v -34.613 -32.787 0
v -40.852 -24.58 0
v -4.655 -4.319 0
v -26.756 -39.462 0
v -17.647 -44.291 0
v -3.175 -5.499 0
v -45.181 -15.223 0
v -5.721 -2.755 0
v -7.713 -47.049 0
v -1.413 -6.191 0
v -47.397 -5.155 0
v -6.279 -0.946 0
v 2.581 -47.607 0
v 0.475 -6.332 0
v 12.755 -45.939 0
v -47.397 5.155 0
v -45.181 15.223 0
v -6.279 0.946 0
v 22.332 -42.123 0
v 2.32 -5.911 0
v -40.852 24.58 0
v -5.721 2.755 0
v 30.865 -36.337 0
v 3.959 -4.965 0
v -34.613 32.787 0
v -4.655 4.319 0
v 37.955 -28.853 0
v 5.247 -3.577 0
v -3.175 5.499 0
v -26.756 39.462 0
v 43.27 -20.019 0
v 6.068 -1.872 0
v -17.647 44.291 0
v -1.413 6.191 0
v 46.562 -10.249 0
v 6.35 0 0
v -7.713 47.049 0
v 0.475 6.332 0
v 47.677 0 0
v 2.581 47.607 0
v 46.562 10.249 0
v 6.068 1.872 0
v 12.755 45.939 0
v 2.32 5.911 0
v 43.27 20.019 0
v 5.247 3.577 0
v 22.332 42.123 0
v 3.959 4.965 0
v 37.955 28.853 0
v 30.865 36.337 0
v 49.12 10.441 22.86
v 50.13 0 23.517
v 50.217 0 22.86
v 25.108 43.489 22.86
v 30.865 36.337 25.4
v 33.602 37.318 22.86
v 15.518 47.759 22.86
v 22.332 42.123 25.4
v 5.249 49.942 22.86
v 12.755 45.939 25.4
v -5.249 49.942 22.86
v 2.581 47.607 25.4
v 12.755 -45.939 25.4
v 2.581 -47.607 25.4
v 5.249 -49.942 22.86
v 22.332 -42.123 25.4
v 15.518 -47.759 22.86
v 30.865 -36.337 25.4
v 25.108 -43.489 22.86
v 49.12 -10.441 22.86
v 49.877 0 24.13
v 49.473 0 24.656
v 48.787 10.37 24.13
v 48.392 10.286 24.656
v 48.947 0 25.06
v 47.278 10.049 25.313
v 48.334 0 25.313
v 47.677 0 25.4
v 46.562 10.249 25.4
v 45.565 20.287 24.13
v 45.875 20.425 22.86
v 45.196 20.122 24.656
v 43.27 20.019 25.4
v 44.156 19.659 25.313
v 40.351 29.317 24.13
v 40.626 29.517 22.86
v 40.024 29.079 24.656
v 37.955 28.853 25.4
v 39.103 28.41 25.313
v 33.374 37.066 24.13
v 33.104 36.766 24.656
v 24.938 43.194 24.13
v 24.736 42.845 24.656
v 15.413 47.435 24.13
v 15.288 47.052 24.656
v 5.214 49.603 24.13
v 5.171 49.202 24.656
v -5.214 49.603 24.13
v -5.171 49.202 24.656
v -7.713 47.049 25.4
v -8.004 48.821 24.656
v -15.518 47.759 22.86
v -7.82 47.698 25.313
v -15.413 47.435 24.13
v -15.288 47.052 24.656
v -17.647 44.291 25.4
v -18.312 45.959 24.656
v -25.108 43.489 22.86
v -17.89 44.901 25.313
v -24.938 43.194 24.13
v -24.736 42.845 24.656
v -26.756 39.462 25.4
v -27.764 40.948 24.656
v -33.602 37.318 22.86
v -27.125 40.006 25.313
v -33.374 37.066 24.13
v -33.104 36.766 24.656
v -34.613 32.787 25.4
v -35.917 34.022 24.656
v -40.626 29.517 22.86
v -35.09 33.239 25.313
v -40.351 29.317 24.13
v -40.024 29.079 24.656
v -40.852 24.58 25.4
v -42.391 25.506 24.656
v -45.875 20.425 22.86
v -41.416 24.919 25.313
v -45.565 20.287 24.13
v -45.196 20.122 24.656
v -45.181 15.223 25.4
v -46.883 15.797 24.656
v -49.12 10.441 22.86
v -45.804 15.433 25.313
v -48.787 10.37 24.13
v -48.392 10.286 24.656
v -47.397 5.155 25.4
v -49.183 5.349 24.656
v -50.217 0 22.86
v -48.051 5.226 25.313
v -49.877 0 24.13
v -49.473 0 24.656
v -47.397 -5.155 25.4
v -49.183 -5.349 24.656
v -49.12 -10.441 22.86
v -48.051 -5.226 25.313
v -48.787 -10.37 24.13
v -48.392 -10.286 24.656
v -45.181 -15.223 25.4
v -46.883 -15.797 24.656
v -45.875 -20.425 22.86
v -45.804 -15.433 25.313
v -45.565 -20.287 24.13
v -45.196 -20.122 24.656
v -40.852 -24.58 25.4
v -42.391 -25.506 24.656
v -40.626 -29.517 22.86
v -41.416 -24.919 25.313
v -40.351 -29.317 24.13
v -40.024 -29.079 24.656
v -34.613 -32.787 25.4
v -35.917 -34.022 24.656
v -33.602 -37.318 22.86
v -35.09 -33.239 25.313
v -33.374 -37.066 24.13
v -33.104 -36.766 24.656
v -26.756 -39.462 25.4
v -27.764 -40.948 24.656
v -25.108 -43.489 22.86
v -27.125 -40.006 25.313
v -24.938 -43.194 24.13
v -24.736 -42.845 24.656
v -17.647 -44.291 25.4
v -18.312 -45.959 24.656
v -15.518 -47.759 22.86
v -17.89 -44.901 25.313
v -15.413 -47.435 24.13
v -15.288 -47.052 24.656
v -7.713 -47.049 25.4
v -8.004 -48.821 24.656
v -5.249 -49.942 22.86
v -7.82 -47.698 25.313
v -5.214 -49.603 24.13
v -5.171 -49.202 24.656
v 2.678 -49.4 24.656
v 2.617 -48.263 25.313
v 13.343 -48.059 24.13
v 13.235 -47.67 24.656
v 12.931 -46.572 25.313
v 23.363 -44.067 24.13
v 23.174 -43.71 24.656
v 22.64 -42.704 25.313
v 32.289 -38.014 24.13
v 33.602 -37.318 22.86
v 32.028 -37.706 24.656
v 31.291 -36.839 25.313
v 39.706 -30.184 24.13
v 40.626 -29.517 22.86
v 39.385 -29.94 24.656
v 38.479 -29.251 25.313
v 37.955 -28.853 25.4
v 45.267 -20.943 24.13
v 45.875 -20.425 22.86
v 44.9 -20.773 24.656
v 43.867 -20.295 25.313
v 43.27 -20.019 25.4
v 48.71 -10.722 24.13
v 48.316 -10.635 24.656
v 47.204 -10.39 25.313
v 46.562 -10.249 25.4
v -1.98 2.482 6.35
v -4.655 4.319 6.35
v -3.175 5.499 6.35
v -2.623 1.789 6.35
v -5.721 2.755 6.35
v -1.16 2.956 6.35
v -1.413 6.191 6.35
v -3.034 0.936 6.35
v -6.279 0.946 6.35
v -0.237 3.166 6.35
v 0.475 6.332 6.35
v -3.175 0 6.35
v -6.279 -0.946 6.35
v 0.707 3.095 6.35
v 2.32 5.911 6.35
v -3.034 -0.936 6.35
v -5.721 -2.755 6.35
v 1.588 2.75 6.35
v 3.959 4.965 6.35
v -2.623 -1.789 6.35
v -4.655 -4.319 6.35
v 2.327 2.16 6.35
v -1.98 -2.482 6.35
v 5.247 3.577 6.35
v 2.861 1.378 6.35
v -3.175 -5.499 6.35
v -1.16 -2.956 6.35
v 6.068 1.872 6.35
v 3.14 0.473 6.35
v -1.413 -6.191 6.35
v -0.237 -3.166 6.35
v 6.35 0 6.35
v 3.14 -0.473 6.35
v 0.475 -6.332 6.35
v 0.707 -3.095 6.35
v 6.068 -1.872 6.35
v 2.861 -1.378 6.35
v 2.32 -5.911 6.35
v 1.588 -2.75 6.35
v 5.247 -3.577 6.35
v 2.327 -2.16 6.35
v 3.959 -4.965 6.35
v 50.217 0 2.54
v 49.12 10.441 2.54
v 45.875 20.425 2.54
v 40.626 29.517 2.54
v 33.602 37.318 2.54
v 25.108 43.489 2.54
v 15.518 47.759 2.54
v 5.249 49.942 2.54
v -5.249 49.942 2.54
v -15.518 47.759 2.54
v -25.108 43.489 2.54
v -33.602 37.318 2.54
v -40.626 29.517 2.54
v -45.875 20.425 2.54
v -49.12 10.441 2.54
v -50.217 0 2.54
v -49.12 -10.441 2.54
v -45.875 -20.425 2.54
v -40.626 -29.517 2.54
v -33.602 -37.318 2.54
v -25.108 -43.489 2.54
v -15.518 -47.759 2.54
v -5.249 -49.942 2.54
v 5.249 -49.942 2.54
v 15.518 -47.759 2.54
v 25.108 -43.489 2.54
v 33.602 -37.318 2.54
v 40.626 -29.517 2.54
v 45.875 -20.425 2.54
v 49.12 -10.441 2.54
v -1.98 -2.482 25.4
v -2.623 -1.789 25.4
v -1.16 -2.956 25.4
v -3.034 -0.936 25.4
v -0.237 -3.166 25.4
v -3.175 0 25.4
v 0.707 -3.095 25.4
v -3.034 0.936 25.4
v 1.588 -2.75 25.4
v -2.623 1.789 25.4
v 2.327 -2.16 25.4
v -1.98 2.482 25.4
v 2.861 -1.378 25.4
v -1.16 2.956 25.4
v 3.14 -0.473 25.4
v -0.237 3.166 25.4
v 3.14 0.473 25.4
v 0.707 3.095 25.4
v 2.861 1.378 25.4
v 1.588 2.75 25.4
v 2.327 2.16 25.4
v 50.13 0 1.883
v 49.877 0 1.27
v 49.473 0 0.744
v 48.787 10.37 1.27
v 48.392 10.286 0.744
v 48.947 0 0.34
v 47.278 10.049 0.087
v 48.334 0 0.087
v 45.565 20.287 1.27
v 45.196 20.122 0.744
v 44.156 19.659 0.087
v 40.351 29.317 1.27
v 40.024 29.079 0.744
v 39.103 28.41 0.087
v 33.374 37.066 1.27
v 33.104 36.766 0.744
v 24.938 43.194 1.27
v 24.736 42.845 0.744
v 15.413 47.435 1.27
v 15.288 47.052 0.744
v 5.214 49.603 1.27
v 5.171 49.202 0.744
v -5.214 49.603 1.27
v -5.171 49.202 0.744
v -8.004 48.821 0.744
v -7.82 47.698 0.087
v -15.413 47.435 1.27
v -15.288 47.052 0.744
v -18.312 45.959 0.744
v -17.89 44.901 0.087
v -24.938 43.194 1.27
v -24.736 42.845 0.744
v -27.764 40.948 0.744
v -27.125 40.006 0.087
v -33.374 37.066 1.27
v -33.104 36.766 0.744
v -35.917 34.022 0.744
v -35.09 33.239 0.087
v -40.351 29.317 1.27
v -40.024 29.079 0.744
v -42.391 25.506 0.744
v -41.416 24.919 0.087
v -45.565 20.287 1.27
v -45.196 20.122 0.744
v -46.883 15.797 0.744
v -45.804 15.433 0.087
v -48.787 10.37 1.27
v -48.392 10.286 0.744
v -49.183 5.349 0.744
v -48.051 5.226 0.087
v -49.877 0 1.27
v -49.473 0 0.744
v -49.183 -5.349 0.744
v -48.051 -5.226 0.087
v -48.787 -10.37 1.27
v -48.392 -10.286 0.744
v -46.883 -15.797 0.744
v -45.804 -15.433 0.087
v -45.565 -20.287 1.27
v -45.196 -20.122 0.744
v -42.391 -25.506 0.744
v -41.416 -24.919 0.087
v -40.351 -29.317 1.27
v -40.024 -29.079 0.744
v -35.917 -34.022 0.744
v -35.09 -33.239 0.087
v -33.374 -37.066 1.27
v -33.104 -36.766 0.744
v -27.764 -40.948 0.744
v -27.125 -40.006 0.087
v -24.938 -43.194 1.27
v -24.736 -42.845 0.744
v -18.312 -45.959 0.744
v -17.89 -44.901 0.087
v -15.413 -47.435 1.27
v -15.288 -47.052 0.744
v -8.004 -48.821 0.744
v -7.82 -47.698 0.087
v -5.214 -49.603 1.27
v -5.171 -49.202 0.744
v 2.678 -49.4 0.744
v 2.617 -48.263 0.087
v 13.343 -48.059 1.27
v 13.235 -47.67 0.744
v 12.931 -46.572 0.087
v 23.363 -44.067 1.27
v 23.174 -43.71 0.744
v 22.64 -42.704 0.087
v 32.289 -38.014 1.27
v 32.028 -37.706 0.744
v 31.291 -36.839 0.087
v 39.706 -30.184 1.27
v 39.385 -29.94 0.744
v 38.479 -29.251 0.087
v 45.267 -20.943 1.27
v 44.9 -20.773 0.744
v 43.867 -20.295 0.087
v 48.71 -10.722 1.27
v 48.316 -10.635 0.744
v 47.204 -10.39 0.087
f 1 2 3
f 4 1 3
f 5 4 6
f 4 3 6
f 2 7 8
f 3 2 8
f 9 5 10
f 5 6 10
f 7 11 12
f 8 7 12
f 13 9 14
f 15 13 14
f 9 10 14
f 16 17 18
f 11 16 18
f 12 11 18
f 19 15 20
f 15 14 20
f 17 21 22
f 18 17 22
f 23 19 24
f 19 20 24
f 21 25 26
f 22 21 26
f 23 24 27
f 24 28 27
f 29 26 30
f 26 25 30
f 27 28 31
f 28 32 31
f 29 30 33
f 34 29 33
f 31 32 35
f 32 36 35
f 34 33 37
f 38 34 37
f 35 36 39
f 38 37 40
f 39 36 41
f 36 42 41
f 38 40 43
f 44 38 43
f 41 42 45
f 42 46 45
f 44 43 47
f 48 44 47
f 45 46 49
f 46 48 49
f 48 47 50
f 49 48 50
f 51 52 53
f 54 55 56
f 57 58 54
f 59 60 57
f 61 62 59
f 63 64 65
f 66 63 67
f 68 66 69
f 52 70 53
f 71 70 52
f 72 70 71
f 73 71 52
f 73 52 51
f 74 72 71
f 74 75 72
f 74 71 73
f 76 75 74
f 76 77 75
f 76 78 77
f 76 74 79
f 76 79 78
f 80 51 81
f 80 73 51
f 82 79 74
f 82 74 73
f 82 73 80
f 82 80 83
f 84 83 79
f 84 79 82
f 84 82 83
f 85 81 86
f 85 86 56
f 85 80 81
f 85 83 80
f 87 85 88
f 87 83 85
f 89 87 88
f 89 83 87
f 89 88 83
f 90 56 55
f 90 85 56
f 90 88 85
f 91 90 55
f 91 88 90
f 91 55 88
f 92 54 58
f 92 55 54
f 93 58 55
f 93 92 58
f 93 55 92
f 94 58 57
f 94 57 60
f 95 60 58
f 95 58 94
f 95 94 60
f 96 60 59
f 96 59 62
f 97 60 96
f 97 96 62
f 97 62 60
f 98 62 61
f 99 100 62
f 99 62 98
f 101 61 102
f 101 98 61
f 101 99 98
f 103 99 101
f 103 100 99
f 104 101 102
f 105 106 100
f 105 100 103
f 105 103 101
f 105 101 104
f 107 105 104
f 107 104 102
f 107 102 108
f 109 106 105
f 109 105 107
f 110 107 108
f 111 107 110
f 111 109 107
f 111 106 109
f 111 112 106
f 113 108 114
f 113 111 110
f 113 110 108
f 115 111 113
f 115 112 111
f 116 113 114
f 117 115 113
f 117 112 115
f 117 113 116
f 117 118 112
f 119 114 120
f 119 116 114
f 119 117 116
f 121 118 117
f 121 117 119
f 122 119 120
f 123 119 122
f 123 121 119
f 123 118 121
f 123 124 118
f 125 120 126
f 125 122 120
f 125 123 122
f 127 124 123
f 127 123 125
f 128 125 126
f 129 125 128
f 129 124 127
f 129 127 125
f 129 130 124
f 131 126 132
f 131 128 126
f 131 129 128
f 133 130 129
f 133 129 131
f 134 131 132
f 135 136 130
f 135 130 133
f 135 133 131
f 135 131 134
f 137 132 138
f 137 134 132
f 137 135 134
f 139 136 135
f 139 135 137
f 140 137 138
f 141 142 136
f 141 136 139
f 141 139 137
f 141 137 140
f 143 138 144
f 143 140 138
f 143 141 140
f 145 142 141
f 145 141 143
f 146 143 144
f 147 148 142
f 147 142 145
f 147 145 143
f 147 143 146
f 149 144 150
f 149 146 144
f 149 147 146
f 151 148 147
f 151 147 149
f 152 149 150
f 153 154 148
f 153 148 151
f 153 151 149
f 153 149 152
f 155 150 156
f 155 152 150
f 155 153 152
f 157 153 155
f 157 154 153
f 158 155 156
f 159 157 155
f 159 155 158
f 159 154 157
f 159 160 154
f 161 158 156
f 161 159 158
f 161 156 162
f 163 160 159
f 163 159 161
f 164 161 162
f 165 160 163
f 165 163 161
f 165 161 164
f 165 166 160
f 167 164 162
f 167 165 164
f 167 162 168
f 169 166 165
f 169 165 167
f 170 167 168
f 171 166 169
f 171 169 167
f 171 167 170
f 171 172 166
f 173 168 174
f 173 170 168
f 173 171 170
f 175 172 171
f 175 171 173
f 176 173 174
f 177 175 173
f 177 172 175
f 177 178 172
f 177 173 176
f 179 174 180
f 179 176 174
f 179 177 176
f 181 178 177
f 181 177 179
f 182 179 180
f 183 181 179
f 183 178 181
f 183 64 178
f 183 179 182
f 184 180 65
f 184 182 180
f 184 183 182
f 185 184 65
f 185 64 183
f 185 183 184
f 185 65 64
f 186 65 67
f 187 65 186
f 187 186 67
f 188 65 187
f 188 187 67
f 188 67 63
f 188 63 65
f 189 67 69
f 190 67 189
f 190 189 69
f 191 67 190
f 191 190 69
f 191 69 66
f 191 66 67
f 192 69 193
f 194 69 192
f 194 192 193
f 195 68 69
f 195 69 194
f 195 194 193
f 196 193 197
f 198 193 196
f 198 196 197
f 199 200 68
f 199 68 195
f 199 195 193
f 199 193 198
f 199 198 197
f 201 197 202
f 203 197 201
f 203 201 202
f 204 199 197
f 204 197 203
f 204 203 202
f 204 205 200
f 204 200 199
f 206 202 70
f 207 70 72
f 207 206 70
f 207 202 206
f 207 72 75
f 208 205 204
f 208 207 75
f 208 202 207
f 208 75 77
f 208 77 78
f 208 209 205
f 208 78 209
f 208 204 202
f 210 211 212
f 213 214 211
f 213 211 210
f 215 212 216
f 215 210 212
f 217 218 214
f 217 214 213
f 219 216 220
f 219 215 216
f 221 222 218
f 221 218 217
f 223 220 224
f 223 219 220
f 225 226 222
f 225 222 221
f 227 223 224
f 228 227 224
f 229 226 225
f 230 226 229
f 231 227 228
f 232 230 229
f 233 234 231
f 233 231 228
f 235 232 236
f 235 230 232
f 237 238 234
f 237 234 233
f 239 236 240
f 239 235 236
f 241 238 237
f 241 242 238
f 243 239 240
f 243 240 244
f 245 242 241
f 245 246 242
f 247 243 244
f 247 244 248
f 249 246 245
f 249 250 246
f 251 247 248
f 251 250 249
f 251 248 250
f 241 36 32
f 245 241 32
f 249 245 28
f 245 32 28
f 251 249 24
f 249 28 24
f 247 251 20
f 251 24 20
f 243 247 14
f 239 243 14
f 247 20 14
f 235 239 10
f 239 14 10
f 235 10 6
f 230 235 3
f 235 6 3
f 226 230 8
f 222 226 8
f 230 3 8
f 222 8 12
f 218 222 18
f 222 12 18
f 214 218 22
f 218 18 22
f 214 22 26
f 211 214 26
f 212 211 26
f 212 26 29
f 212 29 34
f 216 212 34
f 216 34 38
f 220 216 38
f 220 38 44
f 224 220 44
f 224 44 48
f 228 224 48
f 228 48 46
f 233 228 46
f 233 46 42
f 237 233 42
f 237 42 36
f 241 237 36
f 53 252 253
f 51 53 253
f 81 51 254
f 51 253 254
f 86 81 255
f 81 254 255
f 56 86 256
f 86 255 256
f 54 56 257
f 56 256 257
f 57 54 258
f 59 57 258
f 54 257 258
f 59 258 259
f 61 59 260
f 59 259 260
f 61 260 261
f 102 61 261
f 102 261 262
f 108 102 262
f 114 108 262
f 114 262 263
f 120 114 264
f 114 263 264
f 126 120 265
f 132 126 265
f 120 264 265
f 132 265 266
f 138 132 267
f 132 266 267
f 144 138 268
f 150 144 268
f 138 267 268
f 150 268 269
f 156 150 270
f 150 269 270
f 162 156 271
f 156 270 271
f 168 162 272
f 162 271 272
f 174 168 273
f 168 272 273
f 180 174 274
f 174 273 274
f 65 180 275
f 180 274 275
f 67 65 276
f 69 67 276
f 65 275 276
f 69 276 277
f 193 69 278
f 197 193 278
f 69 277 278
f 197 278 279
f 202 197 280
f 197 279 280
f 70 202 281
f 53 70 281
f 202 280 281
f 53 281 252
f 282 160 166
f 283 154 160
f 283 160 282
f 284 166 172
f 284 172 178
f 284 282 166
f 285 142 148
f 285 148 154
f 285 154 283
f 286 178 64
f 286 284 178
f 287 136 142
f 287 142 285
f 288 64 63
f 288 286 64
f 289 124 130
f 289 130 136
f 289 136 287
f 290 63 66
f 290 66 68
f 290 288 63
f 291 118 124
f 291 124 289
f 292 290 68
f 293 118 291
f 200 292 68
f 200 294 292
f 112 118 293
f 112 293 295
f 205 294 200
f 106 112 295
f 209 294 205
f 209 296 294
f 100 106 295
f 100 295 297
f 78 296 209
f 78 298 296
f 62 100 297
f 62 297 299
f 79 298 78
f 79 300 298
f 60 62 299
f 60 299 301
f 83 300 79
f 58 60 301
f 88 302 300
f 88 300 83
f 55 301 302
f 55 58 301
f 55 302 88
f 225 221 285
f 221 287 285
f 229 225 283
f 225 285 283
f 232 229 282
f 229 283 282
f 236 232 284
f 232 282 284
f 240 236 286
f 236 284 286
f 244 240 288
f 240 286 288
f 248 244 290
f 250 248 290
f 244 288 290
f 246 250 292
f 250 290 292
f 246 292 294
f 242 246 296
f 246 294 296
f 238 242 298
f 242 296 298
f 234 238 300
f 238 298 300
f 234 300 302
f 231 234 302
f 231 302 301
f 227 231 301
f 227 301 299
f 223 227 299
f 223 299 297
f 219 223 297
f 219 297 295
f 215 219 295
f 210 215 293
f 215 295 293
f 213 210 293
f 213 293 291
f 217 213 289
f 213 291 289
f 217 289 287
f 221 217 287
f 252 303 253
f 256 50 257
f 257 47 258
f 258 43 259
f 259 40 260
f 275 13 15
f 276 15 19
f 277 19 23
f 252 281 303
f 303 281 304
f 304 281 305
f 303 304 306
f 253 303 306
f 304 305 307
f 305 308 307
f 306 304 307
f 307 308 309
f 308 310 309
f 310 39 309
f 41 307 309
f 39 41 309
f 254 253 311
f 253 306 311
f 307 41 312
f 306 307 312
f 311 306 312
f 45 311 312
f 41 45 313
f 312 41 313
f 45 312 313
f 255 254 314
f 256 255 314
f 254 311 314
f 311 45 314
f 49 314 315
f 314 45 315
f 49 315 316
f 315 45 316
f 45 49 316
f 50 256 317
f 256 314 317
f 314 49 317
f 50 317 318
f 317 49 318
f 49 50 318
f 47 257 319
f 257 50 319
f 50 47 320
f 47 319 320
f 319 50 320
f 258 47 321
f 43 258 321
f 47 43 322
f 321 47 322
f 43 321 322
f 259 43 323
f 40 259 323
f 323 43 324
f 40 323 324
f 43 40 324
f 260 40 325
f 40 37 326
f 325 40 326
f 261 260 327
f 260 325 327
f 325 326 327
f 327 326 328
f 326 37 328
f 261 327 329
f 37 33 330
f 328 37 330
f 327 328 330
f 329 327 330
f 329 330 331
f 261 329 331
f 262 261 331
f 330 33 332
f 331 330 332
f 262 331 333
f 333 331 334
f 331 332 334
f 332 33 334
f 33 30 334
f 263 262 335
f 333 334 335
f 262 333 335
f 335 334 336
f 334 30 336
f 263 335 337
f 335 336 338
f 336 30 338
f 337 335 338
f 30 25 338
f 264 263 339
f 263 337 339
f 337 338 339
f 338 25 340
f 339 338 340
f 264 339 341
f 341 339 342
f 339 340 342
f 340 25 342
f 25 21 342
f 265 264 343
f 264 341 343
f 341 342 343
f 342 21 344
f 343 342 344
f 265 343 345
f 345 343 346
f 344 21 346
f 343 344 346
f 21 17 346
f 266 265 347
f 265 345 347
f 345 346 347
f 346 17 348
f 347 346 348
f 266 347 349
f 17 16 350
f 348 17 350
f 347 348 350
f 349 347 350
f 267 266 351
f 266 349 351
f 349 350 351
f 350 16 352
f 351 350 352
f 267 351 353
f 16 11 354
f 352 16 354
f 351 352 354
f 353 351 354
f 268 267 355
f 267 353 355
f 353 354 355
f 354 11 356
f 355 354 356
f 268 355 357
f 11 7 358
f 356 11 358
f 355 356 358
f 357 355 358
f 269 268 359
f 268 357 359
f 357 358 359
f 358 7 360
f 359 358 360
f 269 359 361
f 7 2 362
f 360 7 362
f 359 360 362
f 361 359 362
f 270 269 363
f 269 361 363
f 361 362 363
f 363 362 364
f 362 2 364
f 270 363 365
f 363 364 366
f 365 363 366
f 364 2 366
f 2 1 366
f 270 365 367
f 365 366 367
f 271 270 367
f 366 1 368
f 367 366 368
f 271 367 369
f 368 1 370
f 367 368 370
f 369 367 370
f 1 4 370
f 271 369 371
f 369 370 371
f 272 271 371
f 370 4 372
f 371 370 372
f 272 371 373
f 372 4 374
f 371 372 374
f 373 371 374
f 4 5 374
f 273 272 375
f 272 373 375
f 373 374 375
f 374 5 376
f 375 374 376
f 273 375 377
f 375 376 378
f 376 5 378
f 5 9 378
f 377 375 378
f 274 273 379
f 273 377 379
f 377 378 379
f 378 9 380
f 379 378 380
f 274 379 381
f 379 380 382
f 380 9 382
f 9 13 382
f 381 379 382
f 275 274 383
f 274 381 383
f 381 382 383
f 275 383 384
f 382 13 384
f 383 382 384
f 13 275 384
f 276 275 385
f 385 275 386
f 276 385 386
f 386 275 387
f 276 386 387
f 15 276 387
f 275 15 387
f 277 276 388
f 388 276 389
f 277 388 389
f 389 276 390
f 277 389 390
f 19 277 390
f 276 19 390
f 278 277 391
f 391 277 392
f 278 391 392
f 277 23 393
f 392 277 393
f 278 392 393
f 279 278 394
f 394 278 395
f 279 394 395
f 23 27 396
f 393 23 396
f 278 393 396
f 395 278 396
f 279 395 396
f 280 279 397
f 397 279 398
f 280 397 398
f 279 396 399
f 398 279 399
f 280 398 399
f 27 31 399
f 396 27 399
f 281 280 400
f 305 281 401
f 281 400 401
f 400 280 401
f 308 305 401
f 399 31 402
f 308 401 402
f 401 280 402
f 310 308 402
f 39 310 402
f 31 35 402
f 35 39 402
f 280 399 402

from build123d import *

# Parameters (mm, degrees)
F0_R           = 50.216863
F1_DEPTH       = 25.4
F2_R           = 2.54
F3_R           = 2.54
F4_D           = 6.35
F4_CBORE_D     = 12.7
F4_CBORE_DEPTH = 6.35


with BuildPart() as f1:
    # F0 (on Top) → F1 (new body)
    with BuildSketch(Plane.XY):
        Circle(F0_R)
    extrude(amount=F1_DEPTH)

    # F2
    f2_edges = [f1.edges().sort_by_distance(p)[0] for p in [
        (-50.216863, 0, 25.4),
    ]]
    fillet(f2_edges, radius=F2_R)

    # F3
    f3_edges = [f1.edges().sort_by_distance(p)[0] for p in [
        (-50.216863, 0, 0),
    ]]
    fillet(f3_edges, radius=F3_R)

    # F4 (through all)
    with Locations(Plane(origin=(0, 0, 0), x_dir=(1, 0, 0), z_dir=(0, 0, -1))):
        with Locations((0, 0)):
            CounterBoreHole(F4_D / 2, F4_CBORE_D / 2, F4_CBORE_DEPTH)


solid = f1.part
